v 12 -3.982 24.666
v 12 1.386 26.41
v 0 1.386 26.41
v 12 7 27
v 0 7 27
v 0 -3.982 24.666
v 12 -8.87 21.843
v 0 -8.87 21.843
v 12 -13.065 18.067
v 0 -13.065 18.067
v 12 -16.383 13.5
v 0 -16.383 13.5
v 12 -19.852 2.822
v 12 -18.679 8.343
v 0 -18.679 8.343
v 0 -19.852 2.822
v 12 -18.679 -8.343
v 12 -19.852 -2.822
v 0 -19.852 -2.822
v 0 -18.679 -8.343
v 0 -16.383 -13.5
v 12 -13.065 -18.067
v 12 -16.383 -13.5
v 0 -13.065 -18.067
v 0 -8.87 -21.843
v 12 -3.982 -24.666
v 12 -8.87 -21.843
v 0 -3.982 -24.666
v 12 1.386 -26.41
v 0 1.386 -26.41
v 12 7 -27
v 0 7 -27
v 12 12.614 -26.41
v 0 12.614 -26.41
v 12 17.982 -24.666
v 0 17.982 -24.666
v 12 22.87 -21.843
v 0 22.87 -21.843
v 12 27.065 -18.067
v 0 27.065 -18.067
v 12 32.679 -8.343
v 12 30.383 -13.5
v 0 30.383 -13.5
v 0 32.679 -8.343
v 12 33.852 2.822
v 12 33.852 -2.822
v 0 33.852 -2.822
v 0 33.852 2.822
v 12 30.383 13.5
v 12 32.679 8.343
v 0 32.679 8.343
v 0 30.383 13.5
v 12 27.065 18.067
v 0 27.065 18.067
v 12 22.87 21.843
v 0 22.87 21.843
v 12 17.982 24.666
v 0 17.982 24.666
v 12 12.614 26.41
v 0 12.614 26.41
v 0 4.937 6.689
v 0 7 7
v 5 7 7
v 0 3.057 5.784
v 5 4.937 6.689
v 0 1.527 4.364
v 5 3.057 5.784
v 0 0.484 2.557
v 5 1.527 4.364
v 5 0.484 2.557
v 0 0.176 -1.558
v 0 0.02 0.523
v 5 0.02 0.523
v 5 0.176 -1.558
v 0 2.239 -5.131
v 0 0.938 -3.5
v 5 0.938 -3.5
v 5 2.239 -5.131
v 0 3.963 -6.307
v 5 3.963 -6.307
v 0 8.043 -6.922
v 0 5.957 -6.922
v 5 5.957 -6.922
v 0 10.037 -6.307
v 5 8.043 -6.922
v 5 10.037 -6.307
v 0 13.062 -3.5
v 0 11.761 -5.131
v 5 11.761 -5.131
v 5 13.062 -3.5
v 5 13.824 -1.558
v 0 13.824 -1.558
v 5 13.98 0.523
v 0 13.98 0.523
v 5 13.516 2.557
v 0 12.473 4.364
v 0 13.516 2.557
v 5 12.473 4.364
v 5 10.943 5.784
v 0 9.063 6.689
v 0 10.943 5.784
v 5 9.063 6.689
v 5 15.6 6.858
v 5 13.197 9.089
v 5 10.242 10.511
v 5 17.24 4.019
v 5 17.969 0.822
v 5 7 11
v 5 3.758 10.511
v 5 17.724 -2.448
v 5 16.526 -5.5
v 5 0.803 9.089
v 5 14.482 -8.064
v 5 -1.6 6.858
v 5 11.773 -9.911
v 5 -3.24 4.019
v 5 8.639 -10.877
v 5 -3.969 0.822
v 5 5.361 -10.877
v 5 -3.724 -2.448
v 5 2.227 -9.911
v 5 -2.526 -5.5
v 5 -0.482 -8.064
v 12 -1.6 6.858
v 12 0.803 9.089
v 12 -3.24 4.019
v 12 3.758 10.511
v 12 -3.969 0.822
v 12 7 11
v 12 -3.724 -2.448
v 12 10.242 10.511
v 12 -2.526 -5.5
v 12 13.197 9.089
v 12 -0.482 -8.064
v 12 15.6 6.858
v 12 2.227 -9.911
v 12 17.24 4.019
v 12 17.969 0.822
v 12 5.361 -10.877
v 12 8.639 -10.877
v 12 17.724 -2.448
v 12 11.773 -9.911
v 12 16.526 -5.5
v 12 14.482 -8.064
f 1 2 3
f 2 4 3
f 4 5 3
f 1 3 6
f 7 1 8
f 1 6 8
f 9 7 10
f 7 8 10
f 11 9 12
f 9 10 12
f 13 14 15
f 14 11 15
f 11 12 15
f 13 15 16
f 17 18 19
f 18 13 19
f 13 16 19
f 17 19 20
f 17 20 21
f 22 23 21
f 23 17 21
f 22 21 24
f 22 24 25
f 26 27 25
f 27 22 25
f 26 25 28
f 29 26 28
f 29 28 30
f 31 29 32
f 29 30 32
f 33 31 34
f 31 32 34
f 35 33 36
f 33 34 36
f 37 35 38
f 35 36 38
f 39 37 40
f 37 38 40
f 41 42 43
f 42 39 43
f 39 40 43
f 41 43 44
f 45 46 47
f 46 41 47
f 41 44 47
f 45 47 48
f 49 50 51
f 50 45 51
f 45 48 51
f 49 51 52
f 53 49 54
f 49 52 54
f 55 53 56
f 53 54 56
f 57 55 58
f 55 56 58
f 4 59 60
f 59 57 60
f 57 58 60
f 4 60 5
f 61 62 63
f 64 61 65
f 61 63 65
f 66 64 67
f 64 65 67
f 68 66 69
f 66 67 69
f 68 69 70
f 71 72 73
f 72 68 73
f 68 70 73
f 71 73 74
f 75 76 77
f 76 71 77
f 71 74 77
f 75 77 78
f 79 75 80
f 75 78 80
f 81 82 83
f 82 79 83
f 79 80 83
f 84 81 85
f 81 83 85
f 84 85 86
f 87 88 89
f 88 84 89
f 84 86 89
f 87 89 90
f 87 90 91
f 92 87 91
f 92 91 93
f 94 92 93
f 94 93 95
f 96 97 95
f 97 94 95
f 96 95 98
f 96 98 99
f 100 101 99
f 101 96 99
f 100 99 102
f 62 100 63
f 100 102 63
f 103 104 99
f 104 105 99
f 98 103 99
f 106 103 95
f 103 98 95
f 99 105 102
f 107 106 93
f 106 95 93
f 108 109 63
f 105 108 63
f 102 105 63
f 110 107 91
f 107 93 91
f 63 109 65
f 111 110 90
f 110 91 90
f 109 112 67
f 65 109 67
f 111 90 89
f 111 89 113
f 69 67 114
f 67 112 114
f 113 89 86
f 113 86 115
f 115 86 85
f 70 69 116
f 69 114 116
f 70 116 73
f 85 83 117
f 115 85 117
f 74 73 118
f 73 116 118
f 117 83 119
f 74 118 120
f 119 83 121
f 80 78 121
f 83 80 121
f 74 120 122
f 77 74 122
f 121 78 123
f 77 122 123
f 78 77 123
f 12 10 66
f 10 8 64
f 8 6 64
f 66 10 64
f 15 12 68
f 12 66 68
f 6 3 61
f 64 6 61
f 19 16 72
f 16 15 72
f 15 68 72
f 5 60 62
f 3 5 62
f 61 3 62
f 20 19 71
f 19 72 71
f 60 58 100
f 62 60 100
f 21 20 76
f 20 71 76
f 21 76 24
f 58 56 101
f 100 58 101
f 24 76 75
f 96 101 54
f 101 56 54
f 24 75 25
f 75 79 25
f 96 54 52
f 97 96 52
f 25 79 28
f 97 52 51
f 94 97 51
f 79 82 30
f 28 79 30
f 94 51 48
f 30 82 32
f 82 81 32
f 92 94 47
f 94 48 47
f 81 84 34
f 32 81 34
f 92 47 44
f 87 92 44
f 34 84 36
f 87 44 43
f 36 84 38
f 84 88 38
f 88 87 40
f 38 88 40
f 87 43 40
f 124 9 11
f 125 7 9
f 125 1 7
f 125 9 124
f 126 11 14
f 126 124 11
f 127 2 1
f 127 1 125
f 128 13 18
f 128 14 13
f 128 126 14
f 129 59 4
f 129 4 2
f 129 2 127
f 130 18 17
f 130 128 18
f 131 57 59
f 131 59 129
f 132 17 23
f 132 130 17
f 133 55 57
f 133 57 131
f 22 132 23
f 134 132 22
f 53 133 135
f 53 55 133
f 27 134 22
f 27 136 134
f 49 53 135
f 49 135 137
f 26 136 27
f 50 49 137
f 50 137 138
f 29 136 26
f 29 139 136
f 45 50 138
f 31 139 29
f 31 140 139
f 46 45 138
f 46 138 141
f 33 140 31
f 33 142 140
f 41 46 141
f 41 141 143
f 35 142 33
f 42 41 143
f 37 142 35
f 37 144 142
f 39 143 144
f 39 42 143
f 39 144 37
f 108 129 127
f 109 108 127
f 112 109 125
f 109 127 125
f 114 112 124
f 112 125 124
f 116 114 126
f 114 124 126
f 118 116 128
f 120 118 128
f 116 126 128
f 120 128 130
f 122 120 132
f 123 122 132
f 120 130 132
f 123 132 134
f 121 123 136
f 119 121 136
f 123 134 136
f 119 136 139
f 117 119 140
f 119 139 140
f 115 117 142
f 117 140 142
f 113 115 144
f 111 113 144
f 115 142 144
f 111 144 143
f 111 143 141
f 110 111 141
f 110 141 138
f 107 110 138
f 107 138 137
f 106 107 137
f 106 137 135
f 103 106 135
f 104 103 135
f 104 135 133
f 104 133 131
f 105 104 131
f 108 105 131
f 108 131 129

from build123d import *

# Parameters (mm, degrees)
SKETCH2_R          = 2.5
CUT_EXTRUDE1_DEPTH = 47.445475819
CIRPATTERN1_COUNT  = 10


with BuildPart() as part:
    # Sketch1 → Revolve1 (revolve)
    with BuildSketch(Plane.XY, mode=Mode.PRIVATE) as revolve1_sk:
        Polygon((-5, 0), (5, 0), (5, -4), (12, -4), (16.497946055, -15.125128372), (13, -20), (-13, -20), (-16.497946055, -15.125128372), (-12, -4), (-5, -4), align=None)
    revolve(revolve1_sk.sketch.rotate(Axis((0, 7, 0), (1, 0, 0)), 270), axis=Axis((0, 7, 0), (1, 0, 0)))

    # SurfaceCut1
    split(bisect_by=Plane(origin=(0, 0, 0), x_dir=(0, 0, -1), z_dir=(1, 0, 0)), keep=Keep.TOP)

    # SurfaceCut4
    split(bisect_by=Plane(origin=(12, 0, 0), x_dir=(0, 0, -1), z_dir=(1, 0, 0)), keep=Keep.BOTTOM)

    # Sketch2 → Cut-Extrude1 (cut, through all)
    with BuildSketch(Plane(origin=(16.497946055, 0, 0), x_dir=(0, 0, -1), z_dir=(1, 0, 0))):
        with Locations((0, 25.5)):
            Circle(SKETCH2_R)
        with Locations((6, 27.5)):
            Circle(SKETCH2_R)
    extrude(amount=-CUT_EXTRUDE1_DEPTH, mode=Mode.SUBTRACT)

    # CirPattern1: part ×10 about axis
    cirpattern1_axis = Axis((0, 7, 0), (1, 0, 0))


with BuildPart() as part_1:
    add(part.part)
    for i in range(1, CIRPATTERN1_COUNT):
        add(part.part.rotate(cirpattern1_axis, i * 360 / CIRPATTERN1_COUNT))


solid = part_1.part
